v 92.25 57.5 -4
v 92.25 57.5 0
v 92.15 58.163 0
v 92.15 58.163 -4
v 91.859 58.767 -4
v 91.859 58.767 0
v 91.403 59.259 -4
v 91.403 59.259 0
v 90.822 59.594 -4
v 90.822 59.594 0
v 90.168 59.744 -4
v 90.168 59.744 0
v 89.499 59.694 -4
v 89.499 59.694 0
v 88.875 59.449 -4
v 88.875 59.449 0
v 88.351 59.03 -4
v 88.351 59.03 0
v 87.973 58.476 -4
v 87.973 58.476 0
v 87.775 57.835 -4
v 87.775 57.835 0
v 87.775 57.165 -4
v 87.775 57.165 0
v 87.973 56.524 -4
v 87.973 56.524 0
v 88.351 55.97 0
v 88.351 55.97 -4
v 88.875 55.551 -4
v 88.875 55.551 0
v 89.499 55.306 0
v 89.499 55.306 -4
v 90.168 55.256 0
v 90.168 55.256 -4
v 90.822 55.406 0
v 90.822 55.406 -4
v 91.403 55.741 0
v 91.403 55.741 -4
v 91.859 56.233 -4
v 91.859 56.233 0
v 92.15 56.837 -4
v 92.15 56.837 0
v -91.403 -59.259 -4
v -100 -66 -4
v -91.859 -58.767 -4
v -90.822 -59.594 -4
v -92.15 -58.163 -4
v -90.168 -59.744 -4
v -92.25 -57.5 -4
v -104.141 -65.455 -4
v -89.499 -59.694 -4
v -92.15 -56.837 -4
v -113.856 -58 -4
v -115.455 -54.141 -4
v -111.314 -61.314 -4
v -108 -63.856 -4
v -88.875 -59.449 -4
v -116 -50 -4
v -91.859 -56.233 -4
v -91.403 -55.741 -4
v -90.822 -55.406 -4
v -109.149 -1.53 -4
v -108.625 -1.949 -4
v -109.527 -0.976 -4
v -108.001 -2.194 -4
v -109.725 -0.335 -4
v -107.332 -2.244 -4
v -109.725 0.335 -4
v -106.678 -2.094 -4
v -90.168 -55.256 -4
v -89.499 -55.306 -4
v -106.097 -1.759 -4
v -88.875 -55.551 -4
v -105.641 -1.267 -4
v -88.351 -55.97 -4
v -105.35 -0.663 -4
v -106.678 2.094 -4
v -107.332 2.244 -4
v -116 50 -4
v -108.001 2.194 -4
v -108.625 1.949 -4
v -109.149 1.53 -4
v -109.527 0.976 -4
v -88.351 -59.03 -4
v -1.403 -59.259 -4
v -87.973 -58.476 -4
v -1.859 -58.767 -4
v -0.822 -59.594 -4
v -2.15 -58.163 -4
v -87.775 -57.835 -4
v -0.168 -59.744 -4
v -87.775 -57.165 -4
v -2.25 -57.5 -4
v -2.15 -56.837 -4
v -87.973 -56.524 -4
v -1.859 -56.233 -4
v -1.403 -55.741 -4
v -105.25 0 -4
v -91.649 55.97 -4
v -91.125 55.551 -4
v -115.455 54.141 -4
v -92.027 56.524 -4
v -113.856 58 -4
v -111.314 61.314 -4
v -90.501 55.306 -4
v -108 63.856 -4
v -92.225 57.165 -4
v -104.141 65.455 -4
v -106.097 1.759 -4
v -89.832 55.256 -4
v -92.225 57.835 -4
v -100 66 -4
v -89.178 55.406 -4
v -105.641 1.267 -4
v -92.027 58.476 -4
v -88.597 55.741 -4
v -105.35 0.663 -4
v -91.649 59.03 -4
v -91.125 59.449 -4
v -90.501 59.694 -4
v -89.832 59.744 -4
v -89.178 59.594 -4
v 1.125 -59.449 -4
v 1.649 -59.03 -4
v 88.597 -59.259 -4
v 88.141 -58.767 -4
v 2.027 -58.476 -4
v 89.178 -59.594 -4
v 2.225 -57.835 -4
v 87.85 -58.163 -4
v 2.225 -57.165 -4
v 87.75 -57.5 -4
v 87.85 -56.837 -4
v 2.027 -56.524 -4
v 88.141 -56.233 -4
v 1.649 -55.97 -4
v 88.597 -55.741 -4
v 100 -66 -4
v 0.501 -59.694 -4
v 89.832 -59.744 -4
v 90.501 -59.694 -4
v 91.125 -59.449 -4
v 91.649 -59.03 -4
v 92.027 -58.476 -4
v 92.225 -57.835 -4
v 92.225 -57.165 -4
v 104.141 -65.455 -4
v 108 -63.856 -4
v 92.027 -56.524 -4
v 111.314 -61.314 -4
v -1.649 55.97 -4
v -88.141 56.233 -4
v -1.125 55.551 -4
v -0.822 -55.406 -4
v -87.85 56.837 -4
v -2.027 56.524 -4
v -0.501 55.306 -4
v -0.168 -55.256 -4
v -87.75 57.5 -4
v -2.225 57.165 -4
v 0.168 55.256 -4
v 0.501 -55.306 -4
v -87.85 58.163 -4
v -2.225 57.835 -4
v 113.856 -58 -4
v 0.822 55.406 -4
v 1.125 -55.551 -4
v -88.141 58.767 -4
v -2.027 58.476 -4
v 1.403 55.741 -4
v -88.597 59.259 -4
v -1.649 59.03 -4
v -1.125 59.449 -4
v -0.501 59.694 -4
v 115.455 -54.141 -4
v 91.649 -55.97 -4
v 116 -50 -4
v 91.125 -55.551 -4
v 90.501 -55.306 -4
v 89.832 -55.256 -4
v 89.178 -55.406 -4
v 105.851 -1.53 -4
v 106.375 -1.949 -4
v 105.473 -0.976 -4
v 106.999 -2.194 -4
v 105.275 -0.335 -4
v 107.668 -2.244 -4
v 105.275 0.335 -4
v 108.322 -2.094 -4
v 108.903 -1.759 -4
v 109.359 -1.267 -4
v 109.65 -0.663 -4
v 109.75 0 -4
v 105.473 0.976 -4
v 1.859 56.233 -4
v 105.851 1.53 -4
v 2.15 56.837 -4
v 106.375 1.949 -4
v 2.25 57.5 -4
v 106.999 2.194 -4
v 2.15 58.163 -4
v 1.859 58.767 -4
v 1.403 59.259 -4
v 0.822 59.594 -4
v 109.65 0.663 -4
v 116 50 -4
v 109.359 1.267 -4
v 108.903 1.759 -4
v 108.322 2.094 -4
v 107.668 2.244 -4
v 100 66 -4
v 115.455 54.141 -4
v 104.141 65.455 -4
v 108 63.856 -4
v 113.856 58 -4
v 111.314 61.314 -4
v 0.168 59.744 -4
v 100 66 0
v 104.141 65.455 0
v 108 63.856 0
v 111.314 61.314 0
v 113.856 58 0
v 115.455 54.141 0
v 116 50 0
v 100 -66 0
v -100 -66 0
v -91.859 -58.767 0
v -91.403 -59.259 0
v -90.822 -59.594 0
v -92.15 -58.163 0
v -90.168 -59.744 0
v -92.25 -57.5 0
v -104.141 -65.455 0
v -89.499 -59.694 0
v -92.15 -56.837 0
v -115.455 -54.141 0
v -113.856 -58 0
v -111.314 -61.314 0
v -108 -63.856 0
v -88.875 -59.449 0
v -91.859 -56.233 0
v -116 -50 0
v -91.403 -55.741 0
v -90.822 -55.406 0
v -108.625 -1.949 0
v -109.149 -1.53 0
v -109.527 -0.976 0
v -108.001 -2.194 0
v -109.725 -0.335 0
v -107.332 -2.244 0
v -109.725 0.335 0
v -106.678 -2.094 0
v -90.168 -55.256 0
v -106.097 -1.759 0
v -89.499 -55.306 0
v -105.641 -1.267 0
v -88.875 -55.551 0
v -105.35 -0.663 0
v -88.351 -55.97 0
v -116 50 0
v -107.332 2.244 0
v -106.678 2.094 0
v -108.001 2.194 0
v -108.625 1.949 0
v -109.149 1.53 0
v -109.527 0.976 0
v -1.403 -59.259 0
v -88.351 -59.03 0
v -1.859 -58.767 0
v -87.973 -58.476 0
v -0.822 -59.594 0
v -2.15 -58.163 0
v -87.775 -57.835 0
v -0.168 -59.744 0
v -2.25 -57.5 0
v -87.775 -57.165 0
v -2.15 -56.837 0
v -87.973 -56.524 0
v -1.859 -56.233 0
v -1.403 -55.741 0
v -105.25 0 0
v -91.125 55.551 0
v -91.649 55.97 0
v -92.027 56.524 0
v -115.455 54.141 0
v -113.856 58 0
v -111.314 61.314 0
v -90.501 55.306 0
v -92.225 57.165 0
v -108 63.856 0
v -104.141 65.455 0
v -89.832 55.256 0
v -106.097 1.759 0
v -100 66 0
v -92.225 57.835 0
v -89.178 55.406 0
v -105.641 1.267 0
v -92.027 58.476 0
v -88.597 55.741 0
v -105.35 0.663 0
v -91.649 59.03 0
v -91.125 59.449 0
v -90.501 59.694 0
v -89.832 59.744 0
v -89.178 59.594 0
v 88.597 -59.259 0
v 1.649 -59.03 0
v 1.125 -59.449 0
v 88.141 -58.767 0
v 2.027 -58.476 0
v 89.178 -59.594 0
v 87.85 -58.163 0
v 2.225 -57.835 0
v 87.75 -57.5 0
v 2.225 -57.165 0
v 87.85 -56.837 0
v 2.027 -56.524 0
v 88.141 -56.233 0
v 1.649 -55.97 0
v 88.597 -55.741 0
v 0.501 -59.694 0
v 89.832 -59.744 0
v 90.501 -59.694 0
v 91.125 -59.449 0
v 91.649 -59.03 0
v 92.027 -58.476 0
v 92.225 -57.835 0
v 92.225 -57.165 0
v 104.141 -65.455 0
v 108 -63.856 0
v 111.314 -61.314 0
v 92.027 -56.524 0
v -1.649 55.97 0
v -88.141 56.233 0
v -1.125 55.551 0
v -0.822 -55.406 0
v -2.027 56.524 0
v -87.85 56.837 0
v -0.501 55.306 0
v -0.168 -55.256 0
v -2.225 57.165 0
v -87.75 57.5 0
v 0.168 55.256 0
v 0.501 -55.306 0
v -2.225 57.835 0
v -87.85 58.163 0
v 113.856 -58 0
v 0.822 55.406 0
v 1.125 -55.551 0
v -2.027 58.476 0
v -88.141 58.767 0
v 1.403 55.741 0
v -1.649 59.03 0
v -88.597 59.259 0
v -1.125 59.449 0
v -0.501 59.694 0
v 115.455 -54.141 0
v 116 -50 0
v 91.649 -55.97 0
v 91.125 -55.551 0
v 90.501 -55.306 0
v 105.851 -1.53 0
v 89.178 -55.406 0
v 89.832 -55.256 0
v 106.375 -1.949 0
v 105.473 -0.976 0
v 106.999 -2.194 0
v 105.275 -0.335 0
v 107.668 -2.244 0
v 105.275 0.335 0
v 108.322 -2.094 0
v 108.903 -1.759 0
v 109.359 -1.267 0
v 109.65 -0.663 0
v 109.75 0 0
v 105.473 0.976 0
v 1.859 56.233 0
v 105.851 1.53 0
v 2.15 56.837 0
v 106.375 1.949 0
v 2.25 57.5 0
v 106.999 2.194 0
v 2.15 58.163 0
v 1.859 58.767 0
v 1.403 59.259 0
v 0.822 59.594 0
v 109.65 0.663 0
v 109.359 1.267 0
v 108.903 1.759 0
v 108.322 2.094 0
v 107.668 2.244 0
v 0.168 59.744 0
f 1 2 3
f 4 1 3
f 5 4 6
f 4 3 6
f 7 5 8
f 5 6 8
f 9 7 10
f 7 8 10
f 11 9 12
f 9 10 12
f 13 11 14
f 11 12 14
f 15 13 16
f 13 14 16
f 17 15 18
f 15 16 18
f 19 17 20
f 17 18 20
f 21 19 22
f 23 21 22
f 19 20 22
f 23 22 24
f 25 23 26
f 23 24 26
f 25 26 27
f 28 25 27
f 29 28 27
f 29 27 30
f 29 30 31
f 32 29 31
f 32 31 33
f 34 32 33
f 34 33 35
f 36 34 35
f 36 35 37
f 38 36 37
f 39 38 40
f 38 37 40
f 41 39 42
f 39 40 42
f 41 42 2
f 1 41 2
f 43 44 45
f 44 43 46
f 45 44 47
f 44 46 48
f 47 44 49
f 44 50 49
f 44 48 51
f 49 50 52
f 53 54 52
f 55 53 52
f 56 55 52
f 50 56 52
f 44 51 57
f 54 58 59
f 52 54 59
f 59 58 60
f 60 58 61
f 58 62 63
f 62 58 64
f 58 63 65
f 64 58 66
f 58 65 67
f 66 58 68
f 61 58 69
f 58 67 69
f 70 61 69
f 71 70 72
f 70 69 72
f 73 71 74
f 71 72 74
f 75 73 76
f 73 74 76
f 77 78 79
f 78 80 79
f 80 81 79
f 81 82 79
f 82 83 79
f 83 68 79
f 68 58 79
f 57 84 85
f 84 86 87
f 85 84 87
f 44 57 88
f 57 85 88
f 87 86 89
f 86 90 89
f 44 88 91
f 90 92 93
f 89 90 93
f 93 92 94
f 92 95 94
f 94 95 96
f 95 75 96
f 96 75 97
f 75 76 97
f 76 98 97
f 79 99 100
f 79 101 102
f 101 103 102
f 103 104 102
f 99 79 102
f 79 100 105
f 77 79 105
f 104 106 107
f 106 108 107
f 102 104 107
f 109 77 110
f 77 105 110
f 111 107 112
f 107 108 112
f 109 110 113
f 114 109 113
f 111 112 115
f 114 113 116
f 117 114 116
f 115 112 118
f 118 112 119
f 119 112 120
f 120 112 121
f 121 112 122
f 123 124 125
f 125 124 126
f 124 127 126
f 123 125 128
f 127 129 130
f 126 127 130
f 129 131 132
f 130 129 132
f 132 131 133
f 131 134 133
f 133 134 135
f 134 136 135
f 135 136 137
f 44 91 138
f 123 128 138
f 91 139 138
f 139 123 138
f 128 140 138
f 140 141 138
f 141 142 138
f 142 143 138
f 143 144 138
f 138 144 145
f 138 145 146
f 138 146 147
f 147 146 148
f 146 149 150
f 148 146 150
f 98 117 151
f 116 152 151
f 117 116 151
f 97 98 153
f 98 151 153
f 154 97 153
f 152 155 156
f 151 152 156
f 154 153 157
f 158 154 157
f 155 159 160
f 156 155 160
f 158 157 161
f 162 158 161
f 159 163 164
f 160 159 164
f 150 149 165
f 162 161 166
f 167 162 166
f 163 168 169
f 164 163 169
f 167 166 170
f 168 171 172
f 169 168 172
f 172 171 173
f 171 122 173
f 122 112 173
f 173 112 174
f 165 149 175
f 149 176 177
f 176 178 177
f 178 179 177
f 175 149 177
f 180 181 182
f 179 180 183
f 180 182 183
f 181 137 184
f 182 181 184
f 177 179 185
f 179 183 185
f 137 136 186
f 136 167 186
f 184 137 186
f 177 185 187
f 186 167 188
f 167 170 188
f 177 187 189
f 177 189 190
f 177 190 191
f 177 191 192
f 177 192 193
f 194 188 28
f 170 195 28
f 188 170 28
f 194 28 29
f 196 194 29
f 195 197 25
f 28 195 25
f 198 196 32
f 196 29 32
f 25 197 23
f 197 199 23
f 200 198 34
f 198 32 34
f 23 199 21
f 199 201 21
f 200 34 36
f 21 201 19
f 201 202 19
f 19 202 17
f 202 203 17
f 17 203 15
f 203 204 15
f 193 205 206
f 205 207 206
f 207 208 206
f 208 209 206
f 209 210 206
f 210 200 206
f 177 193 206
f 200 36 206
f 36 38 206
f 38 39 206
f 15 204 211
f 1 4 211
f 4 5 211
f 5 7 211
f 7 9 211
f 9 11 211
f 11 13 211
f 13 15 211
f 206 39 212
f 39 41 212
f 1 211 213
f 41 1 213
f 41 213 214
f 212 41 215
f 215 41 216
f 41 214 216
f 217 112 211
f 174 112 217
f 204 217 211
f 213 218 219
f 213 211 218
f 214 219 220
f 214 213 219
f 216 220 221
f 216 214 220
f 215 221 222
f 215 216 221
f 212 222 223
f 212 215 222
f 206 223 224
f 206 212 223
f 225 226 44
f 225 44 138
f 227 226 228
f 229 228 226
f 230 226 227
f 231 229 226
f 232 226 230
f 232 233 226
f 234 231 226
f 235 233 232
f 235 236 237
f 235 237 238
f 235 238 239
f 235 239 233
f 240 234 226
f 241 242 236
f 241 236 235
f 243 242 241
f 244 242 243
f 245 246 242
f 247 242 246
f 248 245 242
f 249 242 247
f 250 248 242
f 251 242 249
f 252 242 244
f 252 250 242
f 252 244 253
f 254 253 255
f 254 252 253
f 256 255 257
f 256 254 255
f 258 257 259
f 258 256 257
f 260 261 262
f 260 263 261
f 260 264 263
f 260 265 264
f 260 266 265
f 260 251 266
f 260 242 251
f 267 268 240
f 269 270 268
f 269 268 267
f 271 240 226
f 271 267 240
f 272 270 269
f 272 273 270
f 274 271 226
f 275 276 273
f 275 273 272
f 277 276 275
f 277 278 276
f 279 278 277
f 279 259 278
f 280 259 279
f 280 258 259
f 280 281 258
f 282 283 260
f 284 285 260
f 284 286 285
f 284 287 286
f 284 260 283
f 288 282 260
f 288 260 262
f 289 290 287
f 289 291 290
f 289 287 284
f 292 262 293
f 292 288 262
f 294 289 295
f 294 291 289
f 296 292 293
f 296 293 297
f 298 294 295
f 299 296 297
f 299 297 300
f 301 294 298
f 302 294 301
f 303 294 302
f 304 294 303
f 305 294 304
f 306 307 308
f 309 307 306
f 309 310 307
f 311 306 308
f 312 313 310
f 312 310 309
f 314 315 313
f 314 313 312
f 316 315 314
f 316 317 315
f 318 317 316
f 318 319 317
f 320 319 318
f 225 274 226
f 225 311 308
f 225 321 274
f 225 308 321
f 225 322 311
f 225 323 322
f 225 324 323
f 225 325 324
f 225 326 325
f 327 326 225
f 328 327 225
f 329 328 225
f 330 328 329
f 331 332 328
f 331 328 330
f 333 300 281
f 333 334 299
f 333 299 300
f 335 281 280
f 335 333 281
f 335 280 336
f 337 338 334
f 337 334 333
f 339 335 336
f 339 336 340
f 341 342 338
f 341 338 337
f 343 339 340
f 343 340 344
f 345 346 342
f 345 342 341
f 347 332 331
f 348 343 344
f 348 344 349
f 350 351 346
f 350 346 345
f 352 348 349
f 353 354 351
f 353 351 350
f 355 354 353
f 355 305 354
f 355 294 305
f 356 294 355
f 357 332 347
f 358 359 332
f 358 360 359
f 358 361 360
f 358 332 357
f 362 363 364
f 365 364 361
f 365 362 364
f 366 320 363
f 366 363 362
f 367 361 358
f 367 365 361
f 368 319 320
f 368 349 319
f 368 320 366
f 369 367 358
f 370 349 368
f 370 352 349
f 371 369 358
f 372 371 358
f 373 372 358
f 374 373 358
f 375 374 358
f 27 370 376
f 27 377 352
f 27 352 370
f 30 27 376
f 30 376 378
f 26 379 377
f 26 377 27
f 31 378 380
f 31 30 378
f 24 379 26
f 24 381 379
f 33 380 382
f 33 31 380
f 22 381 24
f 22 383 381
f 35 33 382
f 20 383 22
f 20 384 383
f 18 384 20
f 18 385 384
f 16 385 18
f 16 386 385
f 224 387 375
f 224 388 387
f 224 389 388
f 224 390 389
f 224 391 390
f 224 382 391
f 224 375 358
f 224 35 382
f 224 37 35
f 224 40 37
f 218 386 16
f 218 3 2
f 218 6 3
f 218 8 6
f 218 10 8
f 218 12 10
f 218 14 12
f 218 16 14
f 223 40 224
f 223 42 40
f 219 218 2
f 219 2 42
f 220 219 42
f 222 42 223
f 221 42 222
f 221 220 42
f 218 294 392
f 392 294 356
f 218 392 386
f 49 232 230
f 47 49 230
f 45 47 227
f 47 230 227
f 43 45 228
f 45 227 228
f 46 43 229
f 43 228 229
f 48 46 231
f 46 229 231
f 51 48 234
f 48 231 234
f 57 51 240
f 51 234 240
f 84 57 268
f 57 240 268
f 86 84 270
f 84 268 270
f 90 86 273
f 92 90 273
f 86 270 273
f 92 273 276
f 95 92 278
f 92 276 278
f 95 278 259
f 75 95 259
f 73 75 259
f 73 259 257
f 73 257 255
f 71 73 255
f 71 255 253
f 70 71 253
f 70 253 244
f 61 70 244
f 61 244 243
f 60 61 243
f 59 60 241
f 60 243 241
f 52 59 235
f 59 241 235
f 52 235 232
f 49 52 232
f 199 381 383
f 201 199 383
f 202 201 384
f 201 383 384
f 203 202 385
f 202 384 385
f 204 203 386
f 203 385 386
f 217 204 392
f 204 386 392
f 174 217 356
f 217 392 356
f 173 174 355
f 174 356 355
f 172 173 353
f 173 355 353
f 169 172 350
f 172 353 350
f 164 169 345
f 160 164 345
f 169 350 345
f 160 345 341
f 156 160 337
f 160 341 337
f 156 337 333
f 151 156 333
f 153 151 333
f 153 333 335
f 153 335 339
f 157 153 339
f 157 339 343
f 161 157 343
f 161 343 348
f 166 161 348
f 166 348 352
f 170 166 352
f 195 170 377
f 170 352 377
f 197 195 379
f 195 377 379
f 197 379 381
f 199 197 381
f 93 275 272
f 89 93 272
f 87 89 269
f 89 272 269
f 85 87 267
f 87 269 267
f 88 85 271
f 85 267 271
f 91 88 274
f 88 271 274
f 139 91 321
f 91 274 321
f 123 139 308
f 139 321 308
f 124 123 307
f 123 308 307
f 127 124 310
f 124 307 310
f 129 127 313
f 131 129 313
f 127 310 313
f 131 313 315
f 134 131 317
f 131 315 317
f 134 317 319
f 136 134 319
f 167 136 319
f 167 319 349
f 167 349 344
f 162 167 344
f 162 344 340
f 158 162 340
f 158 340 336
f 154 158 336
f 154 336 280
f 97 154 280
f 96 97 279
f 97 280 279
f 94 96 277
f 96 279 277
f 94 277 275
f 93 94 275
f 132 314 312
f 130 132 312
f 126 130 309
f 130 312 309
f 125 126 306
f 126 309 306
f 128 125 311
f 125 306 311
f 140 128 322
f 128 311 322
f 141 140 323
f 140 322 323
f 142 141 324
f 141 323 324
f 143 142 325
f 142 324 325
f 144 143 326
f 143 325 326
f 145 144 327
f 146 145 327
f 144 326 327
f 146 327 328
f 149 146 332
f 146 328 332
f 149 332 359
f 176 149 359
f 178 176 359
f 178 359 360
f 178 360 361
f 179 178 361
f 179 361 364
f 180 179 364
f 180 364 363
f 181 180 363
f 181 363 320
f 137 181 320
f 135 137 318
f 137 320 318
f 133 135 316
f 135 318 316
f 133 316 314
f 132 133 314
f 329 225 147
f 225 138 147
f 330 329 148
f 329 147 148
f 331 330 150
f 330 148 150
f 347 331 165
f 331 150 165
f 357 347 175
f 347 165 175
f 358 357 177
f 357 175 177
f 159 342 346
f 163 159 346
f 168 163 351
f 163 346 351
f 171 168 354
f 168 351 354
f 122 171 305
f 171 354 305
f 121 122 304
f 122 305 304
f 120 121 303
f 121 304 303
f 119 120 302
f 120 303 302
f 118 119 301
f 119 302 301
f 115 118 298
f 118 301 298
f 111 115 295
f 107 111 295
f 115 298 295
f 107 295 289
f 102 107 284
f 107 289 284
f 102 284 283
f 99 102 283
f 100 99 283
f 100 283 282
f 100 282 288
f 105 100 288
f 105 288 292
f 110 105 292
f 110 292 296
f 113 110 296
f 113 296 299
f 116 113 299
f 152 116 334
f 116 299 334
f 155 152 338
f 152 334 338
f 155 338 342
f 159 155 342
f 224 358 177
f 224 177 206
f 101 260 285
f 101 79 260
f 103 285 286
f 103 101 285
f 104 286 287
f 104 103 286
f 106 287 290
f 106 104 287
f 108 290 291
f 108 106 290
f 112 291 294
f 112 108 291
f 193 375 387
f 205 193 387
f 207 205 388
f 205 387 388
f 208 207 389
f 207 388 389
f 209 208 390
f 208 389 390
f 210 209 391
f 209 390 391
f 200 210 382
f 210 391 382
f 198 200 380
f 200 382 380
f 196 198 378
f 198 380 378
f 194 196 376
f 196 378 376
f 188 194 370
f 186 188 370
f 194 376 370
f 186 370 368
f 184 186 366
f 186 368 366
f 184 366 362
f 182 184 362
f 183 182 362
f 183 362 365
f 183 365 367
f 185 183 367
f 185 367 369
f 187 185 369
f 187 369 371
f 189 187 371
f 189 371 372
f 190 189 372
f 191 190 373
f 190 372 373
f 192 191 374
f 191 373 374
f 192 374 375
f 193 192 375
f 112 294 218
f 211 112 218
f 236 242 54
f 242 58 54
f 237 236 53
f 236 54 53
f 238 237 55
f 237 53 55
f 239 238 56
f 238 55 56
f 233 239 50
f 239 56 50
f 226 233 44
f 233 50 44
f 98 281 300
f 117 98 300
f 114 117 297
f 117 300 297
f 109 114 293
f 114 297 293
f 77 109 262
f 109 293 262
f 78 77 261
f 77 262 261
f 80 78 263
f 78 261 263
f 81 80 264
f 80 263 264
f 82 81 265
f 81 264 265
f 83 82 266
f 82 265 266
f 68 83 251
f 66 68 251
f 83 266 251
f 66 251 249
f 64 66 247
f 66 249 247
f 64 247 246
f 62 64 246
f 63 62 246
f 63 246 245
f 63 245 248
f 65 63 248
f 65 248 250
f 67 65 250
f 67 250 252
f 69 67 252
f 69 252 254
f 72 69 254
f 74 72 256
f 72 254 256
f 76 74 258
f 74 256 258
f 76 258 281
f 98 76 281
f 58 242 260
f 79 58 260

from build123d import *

# Parameters (mm, degrees)
SKETCH_1_W             = 232
SKETCH_1_H             = 132
SKETCH_1_R             = 2.25
SM_BASE_FLANGE_1_DEPTH = 4
FILLET_1_R             = 16


# Sheet-metal steps are written as plain solids
with BuildPart() as part:
    # Sketch 1 → Базовая кромка1 (new body)
    with BuildSketch(Plane.XY):
        Rectangle(SKETCH_1_W, SKETCH_1_H)
        with Locations((0, 57.5)):
            Circle(SKETCH_1_R, mode=Mode.SUBTRACT)
        with Locations((-90, 57.5)):
            Circle(SKETCH_1_R, mode=Mode.SUBTRACT)
        with Locations((90, 57.5)):
            Circle(SKETCH_1_R, mode=Mode.SUBTRACT)
        with Locations((-107.5, 0)):
            Circle(SKETCH_1_R, mode=Mode.SUBTRACT)
        with Locations((107.5, 0)):
            Circle(SKETCH_1_R, mode=Mode.SUBTRACT)
        with Locations(Location((90, -57.5, 0), (0, 0, 180))):
            Circle(SKETCH_1_R, mode=Mode.SUBTRACT)
        with Locations(Location((0, -57.5, 0), (0, 0, 180))):
            Circle(SKETCH_1_R, mode=Mode.SUBTRACT)
        with Locations(Location((-90, -57.5, 0), (0, 0, 180))):
            Circle(SKETCH_1_R, mode=Mode.SUBTRACT)
    extrude(amount=-SM_BASE_FLANGE_1_DEPTH)

    # Скругление1
    fillet_1_edges = [part.edges().sort_by_distance(p)[0] for p in [
        (-116, 66, -2),
        (116, 66, -2),
        (116, -66, -2),
        (-116, -66, -2),
    ]]
    fillet(fillet_1_edges, radius=FILLET_1_R)


solid = part.part
